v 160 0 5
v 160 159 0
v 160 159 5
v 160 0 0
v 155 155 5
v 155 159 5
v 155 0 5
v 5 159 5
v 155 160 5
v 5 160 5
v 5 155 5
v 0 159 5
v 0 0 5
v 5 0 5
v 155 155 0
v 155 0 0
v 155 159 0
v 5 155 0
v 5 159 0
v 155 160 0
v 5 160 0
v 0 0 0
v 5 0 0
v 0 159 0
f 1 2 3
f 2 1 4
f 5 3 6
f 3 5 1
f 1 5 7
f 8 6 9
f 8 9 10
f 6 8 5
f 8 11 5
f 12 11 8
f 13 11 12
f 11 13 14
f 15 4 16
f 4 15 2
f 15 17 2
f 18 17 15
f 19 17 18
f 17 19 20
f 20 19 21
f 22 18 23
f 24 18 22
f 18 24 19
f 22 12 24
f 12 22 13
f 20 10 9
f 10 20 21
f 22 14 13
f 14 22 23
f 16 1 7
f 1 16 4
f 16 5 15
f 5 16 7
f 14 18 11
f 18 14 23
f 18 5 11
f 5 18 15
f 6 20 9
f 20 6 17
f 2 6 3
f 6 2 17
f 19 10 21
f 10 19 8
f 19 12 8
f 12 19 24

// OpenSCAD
$fn = 48;


difference() {
	cube(size = [160, 160, 5]);
	translate(v = [5, 0, 0]) {
		cube(size = [150, 155, 5]);
	}
	translate(v = [155, 159, 0]) {
		cube(size = [5, 5, 5]);
	}
	translate(v = [0, 159, 0]) {
		cube(size = [5, 5, 5]);
	}
	translate(v = [20, 146, 0]) {
		linear_extrude(height = 20) {
			polygon(points = [[0, 0], [20, 0], [10.0000000000, 8]]);
		}
	}
	translate(v = [120, 146, 0]) {
		linear_extrude(height = 20) {
			polygon(points = [[0, 0], [20, 0], [10.0000000000, 8]]);
		}
	}
}
